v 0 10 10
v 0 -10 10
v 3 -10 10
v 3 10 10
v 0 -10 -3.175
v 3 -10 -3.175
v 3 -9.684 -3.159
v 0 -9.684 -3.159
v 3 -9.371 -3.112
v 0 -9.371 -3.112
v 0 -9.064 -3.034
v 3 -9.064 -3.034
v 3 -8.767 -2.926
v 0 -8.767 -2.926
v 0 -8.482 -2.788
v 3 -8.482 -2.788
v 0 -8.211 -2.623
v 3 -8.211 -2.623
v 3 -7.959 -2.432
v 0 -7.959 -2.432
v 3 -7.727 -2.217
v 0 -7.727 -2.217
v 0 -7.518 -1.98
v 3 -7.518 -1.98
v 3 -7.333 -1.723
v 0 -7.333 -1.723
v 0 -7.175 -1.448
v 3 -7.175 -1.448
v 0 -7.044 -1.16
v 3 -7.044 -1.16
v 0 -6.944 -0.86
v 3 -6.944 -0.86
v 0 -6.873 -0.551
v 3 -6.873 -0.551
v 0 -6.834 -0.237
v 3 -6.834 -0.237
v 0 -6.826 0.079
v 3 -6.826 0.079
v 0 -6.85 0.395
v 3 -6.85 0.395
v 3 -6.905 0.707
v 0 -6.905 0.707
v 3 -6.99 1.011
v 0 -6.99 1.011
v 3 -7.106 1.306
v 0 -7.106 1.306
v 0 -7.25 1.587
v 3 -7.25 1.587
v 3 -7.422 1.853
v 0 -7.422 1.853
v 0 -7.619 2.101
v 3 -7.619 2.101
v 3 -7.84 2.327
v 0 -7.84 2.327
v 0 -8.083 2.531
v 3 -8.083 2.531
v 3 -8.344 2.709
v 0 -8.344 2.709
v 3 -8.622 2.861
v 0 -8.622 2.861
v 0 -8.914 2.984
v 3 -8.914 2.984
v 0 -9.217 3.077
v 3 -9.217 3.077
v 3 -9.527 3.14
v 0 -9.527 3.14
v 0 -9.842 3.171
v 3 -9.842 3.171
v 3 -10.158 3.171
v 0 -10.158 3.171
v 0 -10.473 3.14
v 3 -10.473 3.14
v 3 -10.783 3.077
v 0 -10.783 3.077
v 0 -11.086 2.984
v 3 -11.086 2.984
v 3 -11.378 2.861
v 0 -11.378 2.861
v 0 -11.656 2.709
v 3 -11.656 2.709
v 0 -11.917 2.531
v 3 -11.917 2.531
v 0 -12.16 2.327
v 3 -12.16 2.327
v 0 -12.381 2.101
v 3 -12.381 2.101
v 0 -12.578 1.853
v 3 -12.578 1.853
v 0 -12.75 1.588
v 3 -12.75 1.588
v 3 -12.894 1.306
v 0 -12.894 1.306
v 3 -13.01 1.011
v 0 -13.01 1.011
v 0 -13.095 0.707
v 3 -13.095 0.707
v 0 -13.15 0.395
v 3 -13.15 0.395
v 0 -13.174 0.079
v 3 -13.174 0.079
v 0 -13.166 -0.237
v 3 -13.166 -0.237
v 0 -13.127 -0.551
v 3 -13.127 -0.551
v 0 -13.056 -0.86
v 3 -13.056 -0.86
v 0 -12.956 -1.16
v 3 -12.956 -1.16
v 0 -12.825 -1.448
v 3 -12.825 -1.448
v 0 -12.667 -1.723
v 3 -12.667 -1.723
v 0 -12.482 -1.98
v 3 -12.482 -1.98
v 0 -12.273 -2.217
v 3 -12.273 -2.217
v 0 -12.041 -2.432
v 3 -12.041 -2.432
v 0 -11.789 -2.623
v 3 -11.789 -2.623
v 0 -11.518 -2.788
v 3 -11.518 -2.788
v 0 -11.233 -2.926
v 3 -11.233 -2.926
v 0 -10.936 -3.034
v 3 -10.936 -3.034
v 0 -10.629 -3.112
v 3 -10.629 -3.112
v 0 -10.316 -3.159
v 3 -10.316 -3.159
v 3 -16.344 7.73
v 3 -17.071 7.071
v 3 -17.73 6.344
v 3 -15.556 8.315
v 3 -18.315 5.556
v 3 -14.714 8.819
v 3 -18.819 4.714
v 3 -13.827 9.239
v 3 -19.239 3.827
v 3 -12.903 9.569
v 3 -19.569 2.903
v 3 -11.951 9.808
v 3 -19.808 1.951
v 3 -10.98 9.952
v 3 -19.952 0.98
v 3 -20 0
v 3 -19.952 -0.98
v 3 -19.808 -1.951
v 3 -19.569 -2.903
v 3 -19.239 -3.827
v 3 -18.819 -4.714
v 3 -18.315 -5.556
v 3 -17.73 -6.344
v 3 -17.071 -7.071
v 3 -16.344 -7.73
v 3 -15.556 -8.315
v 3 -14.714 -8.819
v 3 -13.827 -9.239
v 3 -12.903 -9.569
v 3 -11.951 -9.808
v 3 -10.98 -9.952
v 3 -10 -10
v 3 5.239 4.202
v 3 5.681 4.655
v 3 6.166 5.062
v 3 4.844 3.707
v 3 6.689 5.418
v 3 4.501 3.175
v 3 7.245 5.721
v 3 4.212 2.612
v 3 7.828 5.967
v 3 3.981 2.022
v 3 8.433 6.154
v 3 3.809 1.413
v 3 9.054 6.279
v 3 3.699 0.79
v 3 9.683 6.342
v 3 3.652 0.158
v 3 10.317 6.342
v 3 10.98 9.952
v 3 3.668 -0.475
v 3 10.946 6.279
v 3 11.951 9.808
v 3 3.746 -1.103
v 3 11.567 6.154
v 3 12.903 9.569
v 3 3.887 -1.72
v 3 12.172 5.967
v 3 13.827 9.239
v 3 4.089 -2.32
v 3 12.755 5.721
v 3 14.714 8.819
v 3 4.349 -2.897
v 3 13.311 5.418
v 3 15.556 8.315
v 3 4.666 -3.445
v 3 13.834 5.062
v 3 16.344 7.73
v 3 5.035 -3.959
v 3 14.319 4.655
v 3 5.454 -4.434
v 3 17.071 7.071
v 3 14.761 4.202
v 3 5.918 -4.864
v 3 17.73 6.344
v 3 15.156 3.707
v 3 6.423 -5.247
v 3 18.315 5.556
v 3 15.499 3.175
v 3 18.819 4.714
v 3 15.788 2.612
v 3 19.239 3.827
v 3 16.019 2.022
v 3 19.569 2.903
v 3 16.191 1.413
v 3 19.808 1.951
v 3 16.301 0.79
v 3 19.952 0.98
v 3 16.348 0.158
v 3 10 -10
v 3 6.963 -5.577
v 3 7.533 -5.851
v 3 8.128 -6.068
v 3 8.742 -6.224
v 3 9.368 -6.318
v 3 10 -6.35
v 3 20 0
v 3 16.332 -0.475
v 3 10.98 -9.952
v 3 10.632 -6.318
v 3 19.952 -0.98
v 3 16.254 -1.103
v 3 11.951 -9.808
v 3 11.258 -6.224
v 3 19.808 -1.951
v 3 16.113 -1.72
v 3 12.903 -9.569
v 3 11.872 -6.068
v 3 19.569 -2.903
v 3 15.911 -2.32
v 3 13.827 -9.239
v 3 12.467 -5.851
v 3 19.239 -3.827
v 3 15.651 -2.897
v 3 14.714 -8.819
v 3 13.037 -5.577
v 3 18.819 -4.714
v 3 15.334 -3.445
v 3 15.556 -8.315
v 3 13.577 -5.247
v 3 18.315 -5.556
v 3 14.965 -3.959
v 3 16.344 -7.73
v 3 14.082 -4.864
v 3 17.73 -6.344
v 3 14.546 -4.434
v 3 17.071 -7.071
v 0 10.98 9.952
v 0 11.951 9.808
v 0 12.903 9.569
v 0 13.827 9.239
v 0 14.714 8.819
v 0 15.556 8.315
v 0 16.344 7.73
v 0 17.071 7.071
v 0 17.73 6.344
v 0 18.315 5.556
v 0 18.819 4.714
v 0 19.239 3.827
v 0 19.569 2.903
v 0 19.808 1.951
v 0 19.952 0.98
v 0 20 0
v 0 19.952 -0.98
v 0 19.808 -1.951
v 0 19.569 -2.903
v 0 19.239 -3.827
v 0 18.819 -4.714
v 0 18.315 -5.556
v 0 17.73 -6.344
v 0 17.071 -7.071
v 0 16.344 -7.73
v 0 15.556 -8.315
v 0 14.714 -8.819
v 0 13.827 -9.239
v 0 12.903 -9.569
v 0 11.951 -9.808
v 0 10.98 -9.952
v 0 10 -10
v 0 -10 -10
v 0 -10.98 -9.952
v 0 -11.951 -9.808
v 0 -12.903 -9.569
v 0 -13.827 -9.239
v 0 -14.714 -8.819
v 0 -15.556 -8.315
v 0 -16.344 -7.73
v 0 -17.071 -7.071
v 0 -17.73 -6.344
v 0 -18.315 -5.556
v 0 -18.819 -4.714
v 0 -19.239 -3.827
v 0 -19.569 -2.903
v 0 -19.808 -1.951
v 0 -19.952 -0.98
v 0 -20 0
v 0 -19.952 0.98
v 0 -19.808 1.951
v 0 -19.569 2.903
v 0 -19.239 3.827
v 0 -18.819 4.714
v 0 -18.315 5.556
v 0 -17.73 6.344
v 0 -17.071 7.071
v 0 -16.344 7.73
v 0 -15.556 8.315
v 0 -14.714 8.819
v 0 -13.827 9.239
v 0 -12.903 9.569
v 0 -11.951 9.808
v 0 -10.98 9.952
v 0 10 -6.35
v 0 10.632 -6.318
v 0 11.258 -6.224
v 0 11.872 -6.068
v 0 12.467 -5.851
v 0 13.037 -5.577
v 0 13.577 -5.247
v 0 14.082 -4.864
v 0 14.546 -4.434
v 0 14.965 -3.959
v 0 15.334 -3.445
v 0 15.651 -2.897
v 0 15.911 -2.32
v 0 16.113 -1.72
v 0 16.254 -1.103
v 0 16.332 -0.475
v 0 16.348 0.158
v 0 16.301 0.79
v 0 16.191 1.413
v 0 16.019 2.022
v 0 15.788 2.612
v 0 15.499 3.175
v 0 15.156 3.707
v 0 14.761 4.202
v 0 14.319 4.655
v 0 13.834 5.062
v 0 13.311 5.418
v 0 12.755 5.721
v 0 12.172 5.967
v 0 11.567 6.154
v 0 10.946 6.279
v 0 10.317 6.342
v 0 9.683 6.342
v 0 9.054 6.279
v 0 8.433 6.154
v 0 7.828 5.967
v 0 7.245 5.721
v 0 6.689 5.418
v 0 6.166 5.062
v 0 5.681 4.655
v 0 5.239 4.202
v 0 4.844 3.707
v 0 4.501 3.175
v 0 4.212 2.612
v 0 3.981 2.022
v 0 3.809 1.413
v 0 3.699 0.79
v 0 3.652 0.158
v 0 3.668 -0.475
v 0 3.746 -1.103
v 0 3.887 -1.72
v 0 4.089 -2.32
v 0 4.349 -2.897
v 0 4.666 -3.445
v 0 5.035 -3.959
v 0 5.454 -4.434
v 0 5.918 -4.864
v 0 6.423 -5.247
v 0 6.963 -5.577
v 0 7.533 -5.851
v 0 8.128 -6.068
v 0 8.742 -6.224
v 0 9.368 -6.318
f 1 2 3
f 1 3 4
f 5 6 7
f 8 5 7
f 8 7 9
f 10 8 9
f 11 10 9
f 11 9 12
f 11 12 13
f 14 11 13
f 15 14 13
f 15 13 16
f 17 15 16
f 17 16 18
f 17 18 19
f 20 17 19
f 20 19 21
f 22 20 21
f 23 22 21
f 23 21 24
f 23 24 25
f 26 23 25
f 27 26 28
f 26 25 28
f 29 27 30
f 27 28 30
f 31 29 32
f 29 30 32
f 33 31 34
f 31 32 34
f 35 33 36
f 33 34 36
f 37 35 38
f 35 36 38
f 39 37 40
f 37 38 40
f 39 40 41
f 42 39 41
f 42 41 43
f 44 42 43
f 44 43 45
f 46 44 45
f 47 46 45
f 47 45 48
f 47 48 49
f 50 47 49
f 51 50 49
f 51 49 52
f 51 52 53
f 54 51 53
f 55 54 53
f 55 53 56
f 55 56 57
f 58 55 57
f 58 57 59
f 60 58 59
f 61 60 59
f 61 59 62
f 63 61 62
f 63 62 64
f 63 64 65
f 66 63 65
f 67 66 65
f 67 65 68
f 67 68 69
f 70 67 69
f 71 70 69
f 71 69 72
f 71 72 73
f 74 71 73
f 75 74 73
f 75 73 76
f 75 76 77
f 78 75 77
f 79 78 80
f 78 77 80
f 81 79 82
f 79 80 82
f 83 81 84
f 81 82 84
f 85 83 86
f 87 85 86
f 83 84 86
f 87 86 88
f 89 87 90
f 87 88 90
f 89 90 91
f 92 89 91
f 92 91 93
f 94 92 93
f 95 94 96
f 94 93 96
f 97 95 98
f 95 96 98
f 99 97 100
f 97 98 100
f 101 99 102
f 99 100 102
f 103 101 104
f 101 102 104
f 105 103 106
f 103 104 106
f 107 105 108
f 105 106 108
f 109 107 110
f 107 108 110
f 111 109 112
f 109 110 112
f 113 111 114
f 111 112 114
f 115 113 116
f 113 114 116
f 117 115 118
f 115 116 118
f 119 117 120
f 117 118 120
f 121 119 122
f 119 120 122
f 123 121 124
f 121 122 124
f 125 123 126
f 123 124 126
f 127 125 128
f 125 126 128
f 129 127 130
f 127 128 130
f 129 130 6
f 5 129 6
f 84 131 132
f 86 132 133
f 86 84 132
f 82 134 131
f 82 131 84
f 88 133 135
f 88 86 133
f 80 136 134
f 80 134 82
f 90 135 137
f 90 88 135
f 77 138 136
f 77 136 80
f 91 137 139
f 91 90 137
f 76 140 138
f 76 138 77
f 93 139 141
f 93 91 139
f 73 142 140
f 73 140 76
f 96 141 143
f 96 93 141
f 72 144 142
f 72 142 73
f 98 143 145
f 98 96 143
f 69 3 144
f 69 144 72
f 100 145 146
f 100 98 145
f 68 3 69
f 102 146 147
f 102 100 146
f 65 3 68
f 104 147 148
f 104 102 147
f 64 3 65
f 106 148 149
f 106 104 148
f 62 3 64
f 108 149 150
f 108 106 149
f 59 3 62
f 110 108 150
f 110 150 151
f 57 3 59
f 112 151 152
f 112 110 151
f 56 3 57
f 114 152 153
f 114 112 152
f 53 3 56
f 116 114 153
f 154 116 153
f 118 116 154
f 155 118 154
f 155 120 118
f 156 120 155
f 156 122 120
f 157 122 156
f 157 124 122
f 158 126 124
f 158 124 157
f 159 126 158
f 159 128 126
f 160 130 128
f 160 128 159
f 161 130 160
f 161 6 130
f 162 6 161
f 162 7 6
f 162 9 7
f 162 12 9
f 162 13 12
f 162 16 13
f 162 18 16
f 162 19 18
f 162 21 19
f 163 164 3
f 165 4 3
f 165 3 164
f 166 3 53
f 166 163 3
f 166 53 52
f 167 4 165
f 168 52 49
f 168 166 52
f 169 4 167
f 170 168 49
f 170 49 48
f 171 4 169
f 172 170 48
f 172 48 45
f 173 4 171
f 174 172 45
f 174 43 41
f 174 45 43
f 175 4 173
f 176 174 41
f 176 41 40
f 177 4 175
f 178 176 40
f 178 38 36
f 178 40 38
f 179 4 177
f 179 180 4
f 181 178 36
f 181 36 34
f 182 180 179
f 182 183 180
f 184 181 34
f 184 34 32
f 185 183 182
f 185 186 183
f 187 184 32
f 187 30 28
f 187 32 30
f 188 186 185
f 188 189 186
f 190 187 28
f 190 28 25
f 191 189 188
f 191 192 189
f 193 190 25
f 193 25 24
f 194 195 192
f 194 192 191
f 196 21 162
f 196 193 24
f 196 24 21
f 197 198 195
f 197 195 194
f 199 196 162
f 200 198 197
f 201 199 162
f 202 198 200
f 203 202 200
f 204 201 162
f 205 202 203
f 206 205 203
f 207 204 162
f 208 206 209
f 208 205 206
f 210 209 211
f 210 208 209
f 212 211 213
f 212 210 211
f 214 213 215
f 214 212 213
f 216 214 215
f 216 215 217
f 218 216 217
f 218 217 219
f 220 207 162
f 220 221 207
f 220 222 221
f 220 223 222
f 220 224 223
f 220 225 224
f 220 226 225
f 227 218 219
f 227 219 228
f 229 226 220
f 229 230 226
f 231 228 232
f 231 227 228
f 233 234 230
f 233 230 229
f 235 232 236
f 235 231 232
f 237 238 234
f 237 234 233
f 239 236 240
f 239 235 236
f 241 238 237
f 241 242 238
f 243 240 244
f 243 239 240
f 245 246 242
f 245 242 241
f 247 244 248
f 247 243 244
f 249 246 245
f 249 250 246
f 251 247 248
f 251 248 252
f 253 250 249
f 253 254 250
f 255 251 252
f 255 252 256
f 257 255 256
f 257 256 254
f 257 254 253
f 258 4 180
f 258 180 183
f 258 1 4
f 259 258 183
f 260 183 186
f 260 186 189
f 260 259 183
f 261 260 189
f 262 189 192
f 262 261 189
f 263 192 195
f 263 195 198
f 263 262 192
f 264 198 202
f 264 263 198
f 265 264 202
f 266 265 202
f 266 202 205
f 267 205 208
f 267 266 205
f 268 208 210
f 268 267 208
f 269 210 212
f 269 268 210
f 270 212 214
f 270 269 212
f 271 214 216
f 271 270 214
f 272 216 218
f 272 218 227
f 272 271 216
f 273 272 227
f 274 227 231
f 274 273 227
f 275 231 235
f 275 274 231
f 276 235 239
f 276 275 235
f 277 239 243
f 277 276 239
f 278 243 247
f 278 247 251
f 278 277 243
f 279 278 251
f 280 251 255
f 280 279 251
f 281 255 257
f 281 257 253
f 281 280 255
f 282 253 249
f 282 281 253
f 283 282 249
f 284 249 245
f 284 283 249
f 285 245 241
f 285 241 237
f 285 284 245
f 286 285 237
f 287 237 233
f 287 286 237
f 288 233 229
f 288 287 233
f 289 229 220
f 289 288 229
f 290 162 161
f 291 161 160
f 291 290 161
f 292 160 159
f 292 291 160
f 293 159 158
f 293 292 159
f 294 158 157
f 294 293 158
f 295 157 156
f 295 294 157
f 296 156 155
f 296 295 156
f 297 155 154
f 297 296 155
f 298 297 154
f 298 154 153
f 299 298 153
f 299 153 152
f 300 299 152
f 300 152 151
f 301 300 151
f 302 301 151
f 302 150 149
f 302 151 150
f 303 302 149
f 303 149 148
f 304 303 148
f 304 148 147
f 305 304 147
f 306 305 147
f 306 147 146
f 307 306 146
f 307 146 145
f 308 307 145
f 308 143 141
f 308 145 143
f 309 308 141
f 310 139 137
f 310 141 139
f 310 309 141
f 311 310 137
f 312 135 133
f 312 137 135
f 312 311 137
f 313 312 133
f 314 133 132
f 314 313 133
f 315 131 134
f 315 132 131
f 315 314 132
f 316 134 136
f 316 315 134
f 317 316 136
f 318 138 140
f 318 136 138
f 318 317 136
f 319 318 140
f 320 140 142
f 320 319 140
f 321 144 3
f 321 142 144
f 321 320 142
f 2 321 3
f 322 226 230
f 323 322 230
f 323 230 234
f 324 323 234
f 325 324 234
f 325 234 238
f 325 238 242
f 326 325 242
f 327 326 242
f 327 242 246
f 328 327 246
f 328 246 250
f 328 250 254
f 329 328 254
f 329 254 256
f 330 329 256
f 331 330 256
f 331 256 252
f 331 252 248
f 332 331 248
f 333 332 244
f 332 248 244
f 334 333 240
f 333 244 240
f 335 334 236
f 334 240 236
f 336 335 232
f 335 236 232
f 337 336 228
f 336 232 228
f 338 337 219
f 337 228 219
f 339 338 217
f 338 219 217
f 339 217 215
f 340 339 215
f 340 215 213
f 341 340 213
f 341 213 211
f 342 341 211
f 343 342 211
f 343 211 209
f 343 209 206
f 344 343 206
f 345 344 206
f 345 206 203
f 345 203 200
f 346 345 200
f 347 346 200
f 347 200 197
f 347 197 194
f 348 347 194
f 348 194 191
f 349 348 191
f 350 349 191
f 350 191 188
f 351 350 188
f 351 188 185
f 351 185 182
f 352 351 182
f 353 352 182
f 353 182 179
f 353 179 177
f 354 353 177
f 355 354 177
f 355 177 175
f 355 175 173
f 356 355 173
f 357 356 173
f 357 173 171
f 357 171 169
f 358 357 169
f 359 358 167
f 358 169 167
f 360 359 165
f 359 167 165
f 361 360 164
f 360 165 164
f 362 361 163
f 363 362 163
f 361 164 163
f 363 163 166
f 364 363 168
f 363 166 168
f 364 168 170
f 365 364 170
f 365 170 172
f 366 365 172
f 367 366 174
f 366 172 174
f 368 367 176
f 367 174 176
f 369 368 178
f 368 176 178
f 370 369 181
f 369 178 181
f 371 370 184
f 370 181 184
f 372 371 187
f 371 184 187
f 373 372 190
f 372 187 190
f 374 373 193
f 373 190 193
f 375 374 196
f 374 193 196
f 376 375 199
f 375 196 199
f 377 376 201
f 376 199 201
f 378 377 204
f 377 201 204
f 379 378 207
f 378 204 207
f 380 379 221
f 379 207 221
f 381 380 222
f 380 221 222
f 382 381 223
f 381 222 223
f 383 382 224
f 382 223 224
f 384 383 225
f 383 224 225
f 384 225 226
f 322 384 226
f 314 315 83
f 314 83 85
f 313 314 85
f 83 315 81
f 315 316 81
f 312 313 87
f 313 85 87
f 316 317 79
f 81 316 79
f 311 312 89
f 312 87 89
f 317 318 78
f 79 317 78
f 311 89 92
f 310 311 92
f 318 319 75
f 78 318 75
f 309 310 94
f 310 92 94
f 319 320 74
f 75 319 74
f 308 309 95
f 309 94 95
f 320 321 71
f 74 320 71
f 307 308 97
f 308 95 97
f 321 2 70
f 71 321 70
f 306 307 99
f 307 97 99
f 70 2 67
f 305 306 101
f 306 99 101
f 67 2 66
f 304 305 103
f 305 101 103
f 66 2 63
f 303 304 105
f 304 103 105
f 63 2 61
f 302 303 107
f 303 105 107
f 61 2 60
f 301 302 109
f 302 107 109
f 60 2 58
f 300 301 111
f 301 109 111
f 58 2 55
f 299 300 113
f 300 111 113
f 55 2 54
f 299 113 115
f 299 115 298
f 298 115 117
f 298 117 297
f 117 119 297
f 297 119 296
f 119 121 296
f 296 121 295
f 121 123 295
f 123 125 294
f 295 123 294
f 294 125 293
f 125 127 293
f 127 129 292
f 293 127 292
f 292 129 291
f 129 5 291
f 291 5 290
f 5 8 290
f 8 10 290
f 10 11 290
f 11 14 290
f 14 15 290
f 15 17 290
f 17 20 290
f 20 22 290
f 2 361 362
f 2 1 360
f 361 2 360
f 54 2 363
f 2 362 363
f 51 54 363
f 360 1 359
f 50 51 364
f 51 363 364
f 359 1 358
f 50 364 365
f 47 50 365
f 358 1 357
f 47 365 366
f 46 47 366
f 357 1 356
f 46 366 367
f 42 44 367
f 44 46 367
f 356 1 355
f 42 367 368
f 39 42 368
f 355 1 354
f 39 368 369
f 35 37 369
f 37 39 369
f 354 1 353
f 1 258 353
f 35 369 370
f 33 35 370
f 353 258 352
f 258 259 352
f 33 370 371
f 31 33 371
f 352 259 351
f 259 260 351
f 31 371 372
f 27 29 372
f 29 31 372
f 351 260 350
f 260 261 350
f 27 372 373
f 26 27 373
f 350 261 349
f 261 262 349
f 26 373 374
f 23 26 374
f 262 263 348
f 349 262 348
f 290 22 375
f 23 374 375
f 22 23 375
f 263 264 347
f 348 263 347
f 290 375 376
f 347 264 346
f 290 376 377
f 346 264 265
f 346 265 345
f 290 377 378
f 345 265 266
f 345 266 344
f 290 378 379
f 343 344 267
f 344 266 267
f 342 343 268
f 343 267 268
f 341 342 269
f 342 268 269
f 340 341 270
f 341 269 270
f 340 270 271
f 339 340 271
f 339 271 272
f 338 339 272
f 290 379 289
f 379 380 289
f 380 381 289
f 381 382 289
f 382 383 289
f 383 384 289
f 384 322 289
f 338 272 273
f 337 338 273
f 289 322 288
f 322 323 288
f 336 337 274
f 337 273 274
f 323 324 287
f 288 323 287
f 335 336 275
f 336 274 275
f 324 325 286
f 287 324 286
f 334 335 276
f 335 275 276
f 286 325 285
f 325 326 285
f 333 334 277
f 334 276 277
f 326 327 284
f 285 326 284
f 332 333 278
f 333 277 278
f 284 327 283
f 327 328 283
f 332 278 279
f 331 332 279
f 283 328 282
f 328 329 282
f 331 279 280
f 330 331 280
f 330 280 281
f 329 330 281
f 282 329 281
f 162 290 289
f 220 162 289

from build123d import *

# Parameters (mm, degrees)
SKETCH3_W           = 20
SKETCH3_H           = 40
BOSS_EXTRUDE1_DEPTH = 3
SKETCH4_R           = 6.35
SKETCH4_R_2         = 3.175
CUT_EXTRUDE1_DEPTH  = 5
FILLET2_RADIUS      = 10
FILLET2_LENGTH      = 3
FILLET3_RADIUS      = 10
FILLET3_LENGTH      = 3


with BuildPart() as part:
    # Sketch3 → Boss-Extrude1 (new body)
    with BuildSketch(Plane(origin=(0, 0, 0), x_dir=(0, 0, -1), z_dir=(1, 0, 0))):
        Rectangle(SKETCH3_W, SKETCH3_H)
    extrude(amount=BOSS_EXTRUDE1_DEPTH)

    # Sketch4 → Cut-Extrude1 (cut)
    with BuildSketch(Plane(origin=(3, 0, 0), x_dir=(0, 0, -1), z_dir=(1, 0, 0))):
        with Locations((0, 10)):
            Circle(SKETCH4_R)
        with Locations((0, -10)):
            Circle(SKETCH4_R_2)
    extrude(amount=-CUT_EXTRUDE1_DEPTH, mode=Mode.SUBTRACT)

    # Fillet2: full round fillet: the end face becomes a half cylinder, R = half its width
    fillet2_face = Plane((1.5, -20, 0), x_dir=(-1, 0, 0), z_dir=(0, -1, 0))  # on the end face: x along it, z out of the body
    fillet2_slab = fillet2_face.offset(-FILLET2_RADIUS / 2) * Box(FILLET2_LENGTH, 2 * FILLET2_RADIUS, FILLET2_RADIUS, mode=Mode.PRIVATE)  # the body's end, R deep
    fillet2_round = Plane((1.5, -10, 0), x_dir=(0, -1, 0), z_dir=(-1, 0, 0)) * Cylinder(FILLET2_RADIUS, FILLET2_LENGTH, mode=Mode.PRIVATE)  # its axis R under the face
    add(fillet2_slab - fillet2_round, mode=Mode.SUBTRACT)

    # Fillet3: full round fillet: the end face becomes a half cylinder, R = half its width
    fillet3_face = Plane((1.5, 20, 0), x_dir=(-1, 0, 0), z_dir=(0, 1, 0))  # on the end face: x along it, z out of the body
    fillet3_slab = fillet3_face.offset(-FILLET3_RADIUS / 2) * Box(FILLET3_LENGTH, 2 * FILLET3_RADIUS, FILLET3_RADIUS, mode=Mode.PRIVATE)  # the body's end, R deep
    fillet3_round = Plane((1.5, 10, 0), x_dir=(0, 1, 0), z_dir=(-1, 0, 0)) * Cylinder(FILLET3_RADIUS, FILLET3_LENGTH, mode=Mode.PRIVATE)  # its axis R under the face
    add(fillet3_slab - fillet3_round, mode=Mode.SUBTRACT)


solid = part.part
